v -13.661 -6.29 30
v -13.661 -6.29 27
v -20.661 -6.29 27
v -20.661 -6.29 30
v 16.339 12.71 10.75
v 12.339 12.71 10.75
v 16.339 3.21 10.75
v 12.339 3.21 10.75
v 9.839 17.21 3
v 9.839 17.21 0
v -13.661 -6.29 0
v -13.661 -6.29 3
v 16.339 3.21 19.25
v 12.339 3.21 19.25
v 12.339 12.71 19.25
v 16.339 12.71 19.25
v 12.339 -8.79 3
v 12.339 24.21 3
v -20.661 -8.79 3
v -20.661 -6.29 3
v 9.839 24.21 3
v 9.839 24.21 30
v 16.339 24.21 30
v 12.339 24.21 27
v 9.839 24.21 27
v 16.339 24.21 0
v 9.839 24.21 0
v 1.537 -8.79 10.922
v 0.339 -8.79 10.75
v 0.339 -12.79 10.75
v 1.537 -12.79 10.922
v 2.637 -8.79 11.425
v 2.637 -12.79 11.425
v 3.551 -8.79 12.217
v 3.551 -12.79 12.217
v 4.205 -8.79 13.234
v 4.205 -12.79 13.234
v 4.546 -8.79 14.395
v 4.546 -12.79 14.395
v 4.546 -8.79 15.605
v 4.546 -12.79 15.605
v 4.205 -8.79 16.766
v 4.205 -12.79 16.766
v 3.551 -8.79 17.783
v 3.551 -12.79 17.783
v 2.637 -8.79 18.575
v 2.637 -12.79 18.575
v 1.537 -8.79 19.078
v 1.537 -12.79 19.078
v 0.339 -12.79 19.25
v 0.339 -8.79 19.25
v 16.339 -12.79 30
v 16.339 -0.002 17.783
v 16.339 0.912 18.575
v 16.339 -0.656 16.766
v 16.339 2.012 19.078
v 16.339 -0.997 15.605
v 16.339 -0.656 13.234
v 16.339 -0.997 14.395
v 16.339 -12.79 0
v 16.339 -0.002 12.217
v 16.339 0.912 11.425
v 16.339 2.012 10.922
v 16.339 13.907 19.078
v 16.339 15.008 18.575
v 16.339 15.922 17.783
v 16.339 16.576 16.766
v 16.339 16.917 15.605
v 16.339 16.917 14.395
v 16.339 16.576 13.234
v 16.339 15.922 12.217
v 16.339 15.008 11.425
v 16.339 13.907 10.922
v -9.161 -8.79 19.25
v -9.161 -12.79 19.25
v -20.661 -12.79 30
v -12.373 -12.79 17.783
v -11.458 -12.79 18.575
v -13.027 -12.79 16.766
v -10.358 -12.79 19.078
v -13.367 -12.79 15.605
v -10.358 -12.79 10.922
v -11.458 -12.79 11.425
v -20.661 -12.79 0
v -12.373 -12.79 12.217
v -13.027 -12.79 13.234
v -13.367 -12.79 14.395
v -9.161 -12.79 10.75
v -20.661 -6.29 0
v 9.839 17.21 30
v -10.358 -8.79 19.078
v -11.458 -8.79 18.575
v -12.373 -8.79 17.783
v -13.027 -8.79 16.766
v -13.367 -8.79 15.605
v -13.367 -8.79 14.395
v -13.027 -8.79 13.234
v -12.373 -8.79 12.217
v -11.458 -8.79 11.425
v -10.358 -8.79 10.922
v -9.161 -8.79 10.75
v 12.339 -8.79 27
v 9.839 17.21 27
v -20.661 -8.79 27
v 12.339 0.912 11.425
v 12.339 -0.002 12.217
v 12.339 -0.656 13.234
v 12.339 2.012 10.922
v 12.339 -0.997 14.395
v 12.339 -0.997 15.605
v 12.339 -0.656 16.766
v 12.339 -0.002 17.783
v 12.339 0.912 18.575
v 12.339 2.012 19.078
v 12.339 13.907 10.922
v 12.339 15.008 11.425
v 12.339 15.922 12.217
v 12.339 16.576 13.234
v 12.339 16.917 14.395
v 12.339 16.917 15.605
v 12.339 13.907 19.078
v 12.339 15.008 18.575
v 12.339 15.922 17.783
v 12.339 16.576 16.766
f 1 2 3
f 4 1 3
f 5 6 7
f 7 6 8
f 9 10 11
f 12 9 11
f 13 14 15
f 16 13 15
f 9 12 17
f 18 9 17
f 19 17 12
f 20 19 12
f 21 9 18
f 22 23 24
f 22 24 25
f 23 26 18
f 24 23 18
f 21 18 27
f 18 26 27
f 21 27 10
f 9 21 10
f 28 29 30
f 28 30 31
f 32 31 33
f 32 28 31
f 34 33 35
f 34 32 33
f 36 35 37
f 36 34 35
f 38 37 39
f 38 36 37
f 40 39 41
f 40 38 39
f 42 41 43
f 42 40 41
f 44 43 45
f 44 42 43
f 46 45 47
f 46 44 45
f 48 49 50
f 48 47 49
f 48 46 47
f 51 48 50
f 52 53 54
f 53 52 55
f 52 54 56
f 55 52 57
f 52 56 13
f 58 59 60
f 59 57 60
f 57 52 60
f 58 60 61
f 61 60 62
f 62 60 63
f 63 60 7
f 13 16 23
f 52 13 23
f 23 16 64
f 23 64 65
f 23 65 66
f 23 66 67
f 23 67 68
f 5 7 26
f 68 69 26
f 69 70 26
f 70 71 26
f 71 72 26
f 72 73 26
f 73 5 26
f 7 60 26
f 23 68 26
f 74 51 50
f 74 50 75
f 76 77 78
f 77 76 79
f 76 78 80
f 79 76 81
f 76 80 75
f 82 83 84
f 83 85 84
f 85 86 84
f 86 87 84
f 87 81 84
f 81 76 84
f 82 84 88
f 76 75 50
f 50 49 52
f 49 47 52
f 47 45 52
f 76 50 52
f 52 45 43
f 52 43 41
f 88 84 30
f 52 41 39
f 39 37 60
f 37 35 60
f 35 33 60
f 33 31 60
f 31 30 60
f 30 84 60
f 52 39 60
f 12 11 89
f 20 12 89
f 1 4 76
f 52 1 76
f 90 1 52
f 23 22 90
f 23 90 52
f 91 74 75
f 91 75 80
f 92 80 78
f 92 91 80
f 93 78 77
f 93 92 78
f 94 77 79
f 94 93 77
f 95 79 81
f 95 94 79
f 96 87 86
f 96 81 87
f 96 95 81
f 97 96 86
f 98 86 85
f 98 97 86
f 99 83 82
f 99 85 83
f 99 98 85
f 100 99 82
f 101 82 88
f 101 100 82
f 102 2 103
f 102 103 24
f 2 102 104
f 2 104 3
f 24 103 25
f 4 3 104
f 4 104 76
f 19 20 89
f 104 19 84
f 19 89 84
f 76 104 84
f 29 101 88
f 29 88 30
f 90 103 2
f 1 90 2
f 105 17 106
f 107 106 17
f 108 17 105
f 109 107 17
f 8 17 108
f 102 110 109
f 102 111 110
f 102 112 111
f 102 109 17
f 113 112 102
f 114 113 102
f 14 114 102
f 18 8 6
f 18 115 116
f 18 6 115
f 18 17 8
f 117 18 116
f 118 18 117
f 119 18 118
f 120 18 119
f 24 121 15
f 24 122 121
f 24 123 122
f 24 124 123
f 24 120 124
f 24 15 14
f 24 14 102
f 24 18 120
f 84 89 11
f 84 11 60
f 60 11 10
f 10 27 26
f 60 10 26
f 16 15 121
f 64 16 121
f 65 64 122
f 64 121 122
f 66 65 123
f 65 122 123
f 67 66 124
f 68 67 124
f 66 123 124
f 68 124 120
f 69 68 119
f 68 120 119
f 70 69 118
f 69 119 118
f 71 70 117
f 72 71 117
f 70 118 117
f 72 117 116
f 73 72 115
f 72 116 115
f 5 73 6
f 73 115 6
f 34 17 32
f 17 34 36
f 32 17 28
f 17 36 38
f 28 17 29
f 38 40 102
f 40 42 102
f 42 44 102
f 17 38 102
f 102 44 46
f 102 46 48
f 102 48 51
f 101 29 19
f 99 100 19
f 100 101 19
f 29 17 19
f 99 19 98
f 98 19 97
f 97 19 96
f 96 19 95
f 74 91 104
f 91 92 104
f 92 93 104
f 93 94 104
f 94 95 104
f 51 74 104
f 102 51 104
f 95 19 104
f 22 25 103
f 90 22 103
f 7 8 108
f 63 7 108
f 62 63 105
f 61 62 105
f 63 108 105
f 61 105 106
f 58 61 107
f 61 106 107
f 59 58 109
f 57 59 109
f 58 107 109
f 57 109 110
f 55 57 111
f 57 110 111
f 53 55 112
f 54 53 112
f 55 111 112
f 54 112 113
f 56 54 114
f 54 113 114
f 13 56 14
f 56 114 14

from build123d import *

# Parameters (mm, degrees)
EXTRUDE_1_DEPTH     = 30
SKETCH_3_W          = 24
SKETCH_3_H          = 35.230133155
CUT_EXTRUDE_1_DEPTH = 33
CUT_EXTRUDE_2_DEPTH = 5


with BuildPart() as part:
    # 草图1 → 凸台-拉伸1 (new body)
    with BuildSketch(Plane.XY):
        Polygon((16.339285714, 24.209821429), (9.839285714, 24.209821429), (9.839285714, 17.209821429), (-13.660714286, -6.290178571), (-20.660714286, -6.290178571), (-20.660714286, -12.790178571), (16.339285714, -12.790178571), align=None)
    extrude(amount=EXTRUDE_1_DEPTH)

    # 草图3 → 切除-拉伸1 (cut)
    with BuildSketch(Plane.ZY.offset(20.660714286)):
        with Locations((15, 8.824888007)):
            Rectangle(SKETCH_3_W, SKETCH_3_H)
    extrude(amount=-CUT_EXTRUDE_1_DEPTH, mode=Mode.SUBTRACT)

    # 草图4 → 切除-拉伸2 (cut, through all)
    with BuildSketch(Plane(origin=(0, -8.790178571, 0), x_dir=(1, 0, 0), z_dir=(0, 1, 0))):
        with BuildLine():
            Line((-9.160714286, -10.75), (0.339285714, -10.75))
            ThreePointArc((0.339285714, -10.75), (4.589285714, -15), (0.339285714, -19.25))
            Line((0.339285714, -19.25), (-9.160714286, -19.25))
            ThreePointArc((-9.160714286, -19.25), (-13.410714286, -15), (-9.160714286, -10.75))
        make_face()
    cut_extrude_2 = extrude(amount=-CUT_EXTRUDE_2_DEPTH, mode=Mode.SUBTRACT)

    # 镜向1: 切除-拉伸2 across plane
    add(cut_extrude_2.mirror(Plane(origin=(1.774553571, 1.774553571, 0), x_dir=(0, 0, 1), z_dir=(0.707106781, 0.707106781, 0))), mode=Mode.SUBTRACT)


solid = part.part
